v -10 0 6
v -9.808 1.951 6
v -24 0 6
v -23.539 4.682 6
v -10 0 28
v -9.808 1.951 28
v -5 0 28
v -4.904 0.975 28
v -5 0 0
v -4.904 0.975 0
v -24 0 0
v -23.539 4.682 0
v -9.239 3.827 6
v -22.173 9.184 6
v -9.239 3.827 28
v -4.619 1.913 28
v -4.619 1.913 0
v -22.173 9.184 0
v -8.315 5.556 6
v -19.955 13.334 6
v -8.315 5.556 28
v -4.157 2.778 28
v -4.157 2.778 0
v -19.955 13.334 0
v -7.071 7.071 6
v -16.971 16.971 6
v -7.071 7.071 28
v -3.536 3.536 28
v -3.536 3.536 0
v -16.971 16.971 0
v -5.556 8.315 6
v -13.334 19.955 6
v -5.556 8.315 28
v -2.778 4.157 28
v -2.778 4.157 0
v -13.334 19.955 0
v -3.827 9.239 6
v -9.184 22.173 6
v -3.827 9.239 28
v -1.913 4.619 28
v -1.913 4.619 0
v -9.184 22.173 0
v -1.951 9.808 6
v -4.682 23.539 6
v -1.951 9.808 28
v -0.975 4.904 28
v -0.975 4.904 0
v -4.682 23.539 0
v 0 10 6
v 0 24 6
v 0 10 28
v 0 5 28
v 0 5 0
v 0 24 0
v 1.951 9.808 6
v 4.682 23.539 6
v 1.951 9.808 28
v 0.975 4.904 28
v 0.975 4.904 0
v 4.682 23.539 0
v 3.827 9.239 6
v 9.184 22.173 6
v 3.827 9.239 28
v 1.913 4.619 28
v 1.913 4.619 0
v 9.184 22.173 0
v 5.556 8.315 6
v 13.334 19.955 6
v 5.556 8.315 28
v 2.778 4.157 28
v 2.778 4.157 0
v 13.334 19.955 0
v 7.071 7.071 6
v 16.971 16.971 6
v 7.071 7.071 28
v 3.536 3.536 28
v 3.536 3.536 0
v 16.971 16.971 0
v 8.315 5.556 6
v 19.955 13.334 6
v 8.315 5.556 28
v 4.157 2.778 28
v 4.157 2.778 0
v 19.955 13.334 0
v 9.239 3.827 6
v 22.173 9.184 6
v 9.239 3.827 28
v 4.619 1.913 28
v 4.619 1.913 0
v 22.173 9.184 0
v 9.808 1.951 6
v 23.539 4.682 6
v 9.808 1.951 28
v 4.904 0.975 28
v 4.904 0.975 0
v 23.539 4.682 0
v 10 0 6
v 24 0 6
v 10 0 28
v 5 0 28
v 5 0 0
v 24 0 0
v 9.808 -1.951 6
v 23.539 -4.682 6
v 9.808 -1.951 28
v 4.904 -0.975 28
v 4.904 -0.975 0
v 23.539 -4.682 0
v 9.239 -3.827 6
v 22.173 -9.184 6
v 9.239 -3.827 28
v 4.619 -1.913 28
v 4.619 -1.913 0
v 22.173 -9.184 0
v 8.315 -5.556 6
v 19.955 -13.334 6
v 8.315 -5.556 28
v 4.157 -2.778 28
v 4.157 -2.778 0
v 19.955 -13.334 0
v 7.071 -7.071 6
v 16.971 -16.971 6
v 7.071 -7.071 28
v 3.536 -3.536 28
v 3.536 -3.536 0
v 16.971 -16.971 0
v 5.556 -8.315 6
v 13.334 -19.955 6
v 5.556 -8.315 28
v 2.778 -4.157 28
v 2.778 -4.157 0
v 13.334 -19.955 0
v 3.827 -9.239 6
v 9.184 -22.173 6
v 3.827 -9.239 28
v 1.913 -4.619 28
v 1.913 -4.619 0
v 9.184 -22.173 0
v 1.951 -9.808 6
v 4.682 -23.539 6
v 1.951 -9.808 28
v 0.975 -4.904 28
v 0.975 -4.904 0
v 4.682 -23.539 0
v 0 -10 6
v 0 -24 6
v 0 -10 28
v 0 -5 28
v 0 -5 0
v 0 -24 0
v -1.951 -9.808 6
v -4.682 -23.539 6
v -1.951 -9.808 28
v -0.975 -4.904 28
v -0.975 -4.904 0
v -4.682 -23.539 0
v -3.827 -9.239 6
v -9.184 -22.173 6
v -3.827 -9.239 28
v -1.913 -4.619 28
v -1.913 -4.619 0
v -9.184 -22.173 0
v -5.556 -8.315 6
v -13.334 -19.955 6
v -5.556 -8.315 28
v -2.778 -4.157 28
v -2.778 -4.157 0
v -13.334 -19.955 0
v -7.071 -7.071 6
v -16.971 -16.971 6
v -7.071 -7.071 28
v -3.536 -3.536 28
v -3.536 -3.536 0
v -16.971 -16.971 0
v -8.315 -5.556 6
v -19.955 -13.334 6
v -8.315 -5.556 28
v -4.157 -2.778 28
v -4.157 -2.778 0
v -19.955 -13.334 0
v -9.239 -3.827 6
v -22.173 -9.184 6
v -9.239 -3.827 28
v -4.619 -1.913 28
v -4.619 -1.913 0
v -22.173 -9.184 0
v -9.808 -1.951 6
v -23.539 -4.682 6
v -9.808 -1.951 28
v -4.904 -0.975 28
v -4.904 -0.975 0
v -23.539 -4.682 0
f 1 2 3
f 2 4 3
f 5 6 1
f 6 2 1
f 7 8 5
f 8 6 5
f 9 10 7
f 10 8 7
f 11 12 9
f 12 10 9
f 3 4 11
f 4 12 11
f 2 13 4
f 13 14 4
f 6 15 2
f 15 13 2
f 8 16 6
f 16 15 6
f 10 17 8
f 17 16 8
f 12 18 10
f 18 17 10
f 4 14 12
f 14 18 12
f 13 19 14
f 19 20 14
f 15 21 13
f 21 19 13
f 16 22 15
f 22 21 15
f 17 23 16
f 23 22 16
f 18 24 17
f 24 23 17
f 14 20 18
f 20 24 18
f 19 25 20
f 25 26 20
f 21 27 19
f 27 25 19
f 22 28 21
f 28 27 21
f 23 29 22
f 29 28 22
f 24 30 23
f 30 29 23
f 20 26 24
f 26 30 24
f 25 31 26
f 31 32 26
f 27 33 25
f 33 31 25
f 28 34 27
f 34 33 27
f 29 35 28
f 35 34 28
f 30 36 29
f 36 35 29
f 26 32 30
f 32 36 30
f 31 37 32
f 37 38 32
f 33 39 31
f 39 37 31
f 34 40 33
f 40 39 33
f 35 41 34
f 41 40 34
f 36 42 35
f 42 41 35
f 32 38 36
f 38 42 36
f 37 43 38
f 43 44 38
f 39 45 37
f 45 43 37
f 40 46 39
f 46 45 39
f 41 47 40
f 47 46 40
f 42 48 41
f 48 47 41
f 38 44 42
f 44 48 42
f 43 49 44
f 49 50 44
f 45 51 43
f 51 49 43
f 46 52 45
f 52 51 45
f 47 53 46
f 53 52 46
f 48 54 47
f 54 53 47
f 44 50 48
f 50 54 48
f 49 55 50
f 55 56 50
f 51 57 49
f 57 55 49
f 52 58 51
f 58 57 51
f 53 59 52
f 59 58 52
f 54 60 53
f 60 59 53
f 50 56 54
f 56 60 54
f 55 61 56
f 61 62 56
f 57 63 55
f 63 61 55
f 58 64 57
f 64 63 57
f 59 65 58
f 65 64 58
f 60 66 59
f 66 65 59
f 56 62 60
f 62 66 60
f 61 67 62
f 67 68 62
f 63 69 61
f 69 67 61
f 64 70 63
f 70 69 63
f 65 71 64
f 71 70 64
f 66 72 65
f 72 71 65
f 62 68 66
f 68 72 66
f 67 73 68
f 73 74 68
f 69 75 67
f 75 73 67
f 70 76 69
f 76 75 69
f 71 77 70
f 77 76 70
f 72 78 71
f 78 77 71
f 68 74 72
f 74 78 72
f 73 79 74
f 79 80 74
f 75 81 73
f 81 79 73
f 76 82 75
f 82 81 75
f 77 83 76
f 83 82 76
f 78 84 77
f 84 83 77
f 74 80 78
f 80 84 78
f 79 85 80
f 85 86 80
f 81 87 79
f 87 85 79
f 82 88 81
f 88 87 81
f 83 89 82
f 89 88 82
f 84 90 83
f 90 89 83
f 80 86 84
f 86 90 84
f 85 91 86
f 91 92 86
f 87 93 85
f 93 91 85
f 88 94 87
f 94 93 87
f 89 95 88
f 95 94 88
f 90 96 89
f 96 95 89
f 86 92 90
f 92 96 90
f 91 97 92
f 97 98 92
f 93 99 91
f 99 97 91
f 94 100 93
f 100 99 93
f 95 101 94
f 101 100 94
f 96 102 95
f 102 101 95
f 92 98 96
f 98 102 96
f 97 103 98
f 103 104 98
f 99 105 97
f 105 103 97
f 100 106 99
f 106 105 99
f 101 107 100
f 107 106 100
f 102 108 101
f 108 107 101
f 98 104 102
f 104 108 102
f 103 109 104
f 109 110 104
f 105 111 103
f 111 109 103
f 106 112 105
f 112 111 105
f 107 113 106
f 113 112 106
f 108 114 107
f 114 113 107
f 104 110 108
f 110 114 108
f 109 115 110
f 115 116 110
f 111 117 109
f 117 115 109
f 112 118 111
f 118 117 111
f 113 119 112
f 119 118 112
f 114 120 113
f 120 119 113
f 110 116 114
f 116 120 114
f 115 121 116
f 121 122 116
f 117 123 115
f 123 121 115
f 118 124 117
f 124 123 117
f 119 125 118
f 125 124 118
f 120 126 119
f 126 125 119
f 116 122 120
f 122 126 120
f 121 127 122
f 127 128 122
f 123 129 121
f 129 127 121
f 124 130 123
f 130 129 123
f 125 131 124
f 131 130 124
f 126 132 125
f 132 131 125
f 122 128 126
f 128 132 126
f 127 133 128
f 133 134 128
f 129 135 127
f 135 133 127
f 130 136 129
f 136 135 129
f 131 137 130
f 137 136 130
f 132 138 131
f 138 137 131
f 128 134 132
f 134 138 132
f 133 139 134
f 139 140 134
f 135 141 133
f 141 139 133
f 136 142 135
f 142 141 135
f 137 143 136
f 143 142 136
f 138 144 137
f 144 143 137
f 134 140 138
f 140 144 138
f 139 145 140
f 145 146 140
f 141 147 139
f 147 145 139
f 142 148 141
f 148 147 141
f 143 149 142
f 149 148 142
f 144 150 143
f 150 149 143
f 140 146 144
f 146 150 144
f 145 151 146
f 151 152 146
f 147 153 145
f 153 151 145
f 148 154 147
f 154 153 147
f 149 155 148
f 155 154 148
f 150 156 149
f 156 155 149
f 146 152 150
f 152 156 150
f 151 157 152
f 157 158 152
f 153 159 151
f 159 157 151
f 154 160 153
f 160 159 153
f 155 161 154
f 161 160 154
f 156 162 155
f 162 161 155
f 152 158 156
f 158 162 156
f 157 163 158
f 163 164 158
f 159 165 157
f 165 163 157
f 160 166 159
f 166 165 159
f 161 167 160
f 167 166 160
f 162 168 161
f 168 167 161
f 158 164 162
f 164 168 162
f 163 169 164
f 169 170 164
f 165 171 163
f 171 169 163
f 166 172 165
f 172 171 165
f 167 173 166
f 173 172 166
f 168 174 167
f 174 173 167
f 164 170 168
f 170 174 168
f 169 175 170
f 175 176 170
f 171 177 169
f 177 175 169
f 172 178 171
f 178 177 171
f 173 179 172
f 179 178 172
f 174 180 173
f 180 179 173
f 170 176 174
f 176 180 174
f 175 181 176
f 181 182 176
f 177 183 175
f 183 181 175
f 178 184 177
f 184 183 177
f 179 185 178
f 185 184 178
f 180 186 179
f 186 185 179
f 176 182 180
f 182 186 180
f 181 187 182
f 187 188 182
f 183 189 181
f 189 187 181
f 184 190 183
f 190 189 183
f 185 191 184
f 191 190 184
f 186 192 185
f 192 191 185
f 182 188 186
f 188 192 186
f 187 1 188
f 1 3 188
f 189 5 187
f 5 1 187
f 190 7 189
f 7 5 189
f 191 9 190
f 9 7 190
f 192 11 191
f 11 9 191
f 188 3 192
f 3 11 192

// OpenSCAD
$fn = 32;

// ----------------------------------------------------------------------
// Revolved part: flanged bushing R24
// ----------------------------------------------------------------------

// --- parameters (mm) ---
bore_r = 5;               // bore radius
flange_r = 24;            // flange radius
flange_h = 6;             // flange thickness
sleeve_r = 10;            // sleeve radius
total_h = 28;             // overall height
revolve_angle = 360;      // revolve sweep, degrees

bore_d = 2 * bore_r;
flange_d = 2 * flange_r;
sleeve_d = 2 * sleeve_r;

profile = [[5, 0], [24, 0], [24, 6], [10, 6], [10, 28], [5, 28]];  // primary outline, 6 points, counter clockwise

// --- the one profile operation ---
rotate_extrude(angle = revolve_angle) polygon(points = profile);
